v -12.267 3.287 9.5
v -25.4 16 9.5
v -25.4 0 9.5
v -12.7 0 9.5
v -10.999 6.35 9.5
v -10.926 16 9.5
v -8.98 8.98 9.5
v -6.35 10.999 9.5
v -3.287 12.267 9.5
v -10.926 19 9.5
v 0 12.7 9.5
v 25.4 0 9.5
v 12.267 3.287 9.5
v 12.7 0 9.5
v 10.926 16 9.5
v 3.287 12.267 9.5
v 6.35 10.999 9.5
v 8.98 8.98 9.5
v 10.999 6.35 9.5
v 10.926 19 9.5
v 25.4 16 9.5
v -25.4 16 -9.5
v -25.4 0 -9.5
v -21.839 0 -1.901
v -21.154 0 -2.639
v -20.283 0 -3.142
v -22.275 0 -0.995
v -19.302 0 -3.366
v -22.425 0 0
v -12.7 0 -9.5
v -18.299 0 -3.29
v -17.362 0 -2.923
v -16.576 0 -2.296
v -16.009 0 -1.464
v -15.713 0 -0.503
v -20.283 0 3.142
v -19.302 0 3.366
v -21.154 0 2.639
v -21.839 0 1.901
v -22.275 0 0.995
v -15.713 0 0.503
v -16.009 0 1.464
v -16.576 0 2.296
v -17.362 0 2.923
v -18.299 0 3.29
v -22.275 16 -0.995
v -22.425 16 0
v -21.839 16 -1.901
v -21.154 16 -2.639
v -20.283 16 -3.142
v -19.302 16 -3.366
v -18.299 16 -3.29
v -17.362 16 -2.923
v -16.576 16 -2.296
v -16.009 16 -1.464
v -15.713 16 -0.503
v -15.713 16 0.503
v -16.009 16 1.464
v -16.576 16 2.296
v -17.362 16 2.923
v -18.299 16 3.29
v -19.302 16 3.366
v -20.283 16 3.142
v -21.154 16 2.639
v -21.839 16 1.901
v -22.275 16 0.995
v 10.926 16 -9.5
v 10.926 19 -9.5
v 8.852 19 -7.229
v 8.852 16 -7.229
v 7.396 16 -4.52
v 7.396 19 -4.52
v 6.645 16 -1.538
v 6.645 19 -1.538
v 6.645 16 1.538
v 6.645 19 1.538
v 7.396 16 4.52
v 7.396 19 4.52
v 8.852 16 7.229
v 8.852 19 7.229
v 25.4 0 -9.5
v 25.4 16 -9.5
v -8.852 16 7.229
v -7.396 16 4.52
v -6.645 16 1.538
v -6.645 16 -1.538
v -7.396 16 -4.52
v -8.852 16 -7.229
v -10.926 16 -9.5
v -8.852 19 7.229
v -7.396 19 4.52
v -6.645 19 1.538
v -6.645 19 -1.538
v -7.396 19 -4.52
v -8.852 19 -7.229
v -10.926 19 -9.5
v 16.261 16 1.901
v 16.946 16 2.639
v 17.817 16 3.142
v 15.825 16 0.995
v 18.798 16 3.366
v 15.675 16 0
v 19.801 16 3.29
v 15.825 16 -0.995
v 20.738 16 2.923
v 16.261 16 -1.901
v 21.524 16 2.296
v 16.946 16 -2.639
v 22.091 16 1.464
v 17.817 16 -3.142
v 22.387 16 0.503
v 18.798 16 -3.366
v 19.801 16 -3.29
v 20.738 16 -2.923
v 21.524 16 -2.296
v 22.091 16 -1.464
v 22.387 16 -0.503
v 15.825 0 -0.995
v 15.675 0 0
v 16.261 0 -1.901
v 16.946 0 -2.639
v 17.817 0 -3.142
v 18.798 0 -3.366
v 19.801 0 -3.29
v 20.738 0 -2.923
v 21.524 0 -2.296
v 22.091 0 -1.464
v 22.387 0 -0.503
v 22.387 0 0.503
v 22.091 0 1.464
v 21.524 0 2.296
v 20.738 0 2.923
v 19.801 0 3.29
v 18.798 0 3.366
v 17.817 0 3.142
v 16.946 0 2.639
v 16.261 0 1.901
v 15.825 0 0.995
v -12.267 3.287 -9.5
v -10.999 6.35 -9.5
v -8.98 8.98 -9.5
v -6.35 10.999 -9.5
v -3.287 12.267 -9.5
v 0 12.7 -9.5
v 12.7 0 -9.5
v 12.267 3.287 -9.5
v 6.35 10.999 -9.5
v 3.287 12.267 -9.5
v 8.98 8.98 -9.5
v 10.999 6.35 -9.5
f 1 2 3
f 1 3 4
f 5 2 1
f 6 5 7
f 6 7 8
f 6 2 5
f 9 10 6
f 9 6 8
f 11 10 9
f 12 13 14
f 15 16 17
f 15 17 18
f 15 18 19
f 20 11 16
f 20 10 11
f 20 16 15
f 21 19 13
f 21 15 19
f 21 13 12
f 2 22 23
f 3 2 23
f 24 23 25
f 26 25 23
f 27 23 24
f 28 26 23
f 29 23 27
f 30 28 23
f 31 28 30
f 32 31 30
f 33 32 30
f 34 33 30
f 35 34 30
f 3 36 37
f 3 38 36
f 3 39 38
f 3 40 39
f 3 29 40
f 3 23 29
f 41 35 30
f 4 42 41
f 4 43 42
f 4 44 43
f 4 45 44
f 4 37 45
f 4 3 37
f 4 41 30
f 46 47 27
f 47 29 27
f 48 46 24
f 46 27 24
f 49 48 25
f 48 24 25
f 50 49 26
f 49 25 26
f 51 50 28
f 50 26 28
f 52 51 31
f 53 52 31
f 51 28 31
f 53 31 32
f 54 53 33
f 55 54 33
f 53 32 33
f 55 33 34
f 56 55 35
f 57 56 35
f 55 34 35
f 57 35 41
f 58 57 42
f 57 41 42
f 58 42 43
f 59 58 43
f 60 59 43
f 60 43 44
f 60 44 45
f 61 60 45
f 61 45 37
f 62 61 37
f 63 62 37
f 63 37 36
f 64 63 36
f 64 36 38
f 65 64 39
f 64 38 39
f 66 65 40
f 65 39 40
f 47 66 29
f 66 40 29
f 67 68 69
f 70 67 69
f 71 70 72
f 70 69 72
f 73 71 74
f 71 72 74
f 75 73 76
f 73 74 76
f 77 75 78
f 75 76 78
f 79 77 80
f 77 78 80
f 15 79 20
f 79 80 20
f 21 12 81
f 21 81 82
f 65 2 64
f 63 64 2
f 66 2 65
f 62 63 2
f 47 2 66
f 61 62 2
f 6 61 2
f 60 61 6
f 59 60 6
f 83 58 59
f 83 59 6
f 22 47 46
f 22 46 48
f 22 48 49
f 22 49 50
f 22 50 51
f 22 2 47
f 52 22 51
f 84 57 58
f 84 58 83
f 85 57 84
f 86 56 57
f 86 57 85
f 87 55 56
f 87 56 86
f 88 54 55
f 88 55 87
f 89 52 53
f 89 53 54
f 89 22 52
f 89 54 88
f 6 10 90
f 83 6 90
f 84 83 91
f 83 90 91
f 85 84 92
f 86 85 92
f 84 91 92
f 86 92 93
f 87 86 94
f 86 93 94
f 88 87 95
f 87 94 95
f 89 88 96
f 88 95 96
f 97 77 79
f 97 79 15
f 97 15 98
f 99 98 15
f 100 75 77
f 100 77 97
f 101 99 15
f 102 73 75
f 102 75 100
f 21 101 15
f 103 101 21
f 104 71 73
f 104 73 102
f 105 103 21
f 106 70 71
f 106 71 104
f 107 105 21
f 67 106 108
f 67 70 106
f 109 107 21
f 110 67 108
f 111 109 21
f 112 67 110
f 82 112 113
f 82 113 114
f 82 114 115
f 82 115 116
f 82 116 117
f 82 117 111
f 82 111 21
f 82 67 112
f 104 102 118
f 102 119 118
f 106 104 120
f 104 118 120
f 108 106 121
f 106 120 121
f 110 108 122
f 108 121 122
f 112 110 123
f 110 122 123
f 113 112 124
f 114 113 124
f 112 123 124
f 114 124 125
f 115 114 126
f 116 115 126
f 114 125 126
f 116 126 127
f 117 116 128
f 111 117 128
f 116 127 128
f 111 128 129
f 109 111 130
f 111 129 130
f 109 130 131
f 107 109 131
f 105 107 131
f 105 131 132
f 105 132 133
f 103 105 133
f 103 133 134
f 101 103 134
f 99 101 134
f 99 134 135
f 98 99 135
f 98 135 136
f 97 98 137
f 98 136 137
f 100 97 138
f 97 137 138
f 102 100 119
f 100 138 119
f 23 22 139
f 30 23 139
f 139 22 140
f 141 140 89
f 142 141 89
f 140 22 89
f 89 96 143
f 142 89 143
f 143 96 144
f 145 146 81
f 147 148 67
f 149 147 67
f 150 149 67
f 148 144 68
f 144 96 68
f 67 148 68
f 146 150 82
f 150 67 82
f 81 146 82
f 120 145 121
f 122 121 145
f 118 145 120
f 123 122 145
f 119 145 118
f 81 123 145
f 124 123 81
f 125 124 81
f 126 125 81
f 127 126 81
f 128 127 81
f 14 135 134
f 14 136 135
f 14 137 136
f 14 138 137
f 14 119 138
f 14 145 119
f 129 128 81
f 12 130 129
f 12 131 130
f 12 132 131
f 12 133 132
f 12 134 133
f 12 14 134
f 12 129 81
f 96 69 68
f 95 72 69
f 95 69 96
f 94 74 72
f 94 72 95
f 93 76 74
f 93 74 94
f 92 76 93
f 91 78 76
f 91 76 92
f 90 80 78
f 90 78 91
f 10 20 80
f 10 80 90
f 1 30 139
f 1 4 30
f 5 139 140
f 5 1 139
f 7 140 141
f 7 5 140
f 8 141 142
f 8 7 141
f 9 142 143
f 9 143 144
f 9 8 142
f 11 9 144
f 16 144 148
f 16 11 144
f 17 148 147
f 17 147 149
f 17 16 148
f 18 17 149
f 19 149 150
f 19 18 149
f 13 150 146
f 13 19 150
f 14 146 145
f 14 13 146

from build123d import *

# Parameters (mm, degrees)
BOSS_EXTRUDE1_DEPTH                           = 9.5
CBORE_FOR_M12_HEX_HEAD_CAP_SCREW1_D           = 6.75
CBORE_FOR_M12_HEX_HEAD_CAP_SCREW1_CBORE_D     = 25
CBORE_FOR_M12_HEX_HEAD_CAP_SCREW1_CBORE_DEPTH = 3


with BuildPart() as part:
    # Sketch2 → Boss-Extrude1 (new, symmetric)
    with BuildSketch(Plane.XY):
        with BuildLine():
            Line((12.7, 0), (25.4, 0))
            Line((25.4, 0), (25.4, 19))
            Line((25.4, 19), (-25.4, 19))
            Line((-25.4, 19), (-25.4, 0))
            Line((-25.4, 0), (-12.7, 0))
            ThreePointArc((-12.7, 0), (0, 12.7), (12.7, 0))
        make_face()
    extrude(amount=BOSS_EXTRUDE1_DEPTH, both=True)

    # CBORE for M12 Hex Head Cap Screw1 (through all)
    with Locations(Plane(origin=(0, 19, 0), x_dir=(1, 0, 0), z_dir=(0, 1, 0))):
        with Locations((-19.05, 0), (19.05, 0)):
            CounterBoreHole(CBORE_FOR_M12_HEX_HEAD_CAP_SCREW1_D / 2, CBORE_FOR_M12_HEX_HEAD_CAP_SCREW1_CBORE_D / 2, CBORE_FOR_M12_HEX_HEAD_CAP_SCREW1_CBORE_DEPTH)


solid = part.part
